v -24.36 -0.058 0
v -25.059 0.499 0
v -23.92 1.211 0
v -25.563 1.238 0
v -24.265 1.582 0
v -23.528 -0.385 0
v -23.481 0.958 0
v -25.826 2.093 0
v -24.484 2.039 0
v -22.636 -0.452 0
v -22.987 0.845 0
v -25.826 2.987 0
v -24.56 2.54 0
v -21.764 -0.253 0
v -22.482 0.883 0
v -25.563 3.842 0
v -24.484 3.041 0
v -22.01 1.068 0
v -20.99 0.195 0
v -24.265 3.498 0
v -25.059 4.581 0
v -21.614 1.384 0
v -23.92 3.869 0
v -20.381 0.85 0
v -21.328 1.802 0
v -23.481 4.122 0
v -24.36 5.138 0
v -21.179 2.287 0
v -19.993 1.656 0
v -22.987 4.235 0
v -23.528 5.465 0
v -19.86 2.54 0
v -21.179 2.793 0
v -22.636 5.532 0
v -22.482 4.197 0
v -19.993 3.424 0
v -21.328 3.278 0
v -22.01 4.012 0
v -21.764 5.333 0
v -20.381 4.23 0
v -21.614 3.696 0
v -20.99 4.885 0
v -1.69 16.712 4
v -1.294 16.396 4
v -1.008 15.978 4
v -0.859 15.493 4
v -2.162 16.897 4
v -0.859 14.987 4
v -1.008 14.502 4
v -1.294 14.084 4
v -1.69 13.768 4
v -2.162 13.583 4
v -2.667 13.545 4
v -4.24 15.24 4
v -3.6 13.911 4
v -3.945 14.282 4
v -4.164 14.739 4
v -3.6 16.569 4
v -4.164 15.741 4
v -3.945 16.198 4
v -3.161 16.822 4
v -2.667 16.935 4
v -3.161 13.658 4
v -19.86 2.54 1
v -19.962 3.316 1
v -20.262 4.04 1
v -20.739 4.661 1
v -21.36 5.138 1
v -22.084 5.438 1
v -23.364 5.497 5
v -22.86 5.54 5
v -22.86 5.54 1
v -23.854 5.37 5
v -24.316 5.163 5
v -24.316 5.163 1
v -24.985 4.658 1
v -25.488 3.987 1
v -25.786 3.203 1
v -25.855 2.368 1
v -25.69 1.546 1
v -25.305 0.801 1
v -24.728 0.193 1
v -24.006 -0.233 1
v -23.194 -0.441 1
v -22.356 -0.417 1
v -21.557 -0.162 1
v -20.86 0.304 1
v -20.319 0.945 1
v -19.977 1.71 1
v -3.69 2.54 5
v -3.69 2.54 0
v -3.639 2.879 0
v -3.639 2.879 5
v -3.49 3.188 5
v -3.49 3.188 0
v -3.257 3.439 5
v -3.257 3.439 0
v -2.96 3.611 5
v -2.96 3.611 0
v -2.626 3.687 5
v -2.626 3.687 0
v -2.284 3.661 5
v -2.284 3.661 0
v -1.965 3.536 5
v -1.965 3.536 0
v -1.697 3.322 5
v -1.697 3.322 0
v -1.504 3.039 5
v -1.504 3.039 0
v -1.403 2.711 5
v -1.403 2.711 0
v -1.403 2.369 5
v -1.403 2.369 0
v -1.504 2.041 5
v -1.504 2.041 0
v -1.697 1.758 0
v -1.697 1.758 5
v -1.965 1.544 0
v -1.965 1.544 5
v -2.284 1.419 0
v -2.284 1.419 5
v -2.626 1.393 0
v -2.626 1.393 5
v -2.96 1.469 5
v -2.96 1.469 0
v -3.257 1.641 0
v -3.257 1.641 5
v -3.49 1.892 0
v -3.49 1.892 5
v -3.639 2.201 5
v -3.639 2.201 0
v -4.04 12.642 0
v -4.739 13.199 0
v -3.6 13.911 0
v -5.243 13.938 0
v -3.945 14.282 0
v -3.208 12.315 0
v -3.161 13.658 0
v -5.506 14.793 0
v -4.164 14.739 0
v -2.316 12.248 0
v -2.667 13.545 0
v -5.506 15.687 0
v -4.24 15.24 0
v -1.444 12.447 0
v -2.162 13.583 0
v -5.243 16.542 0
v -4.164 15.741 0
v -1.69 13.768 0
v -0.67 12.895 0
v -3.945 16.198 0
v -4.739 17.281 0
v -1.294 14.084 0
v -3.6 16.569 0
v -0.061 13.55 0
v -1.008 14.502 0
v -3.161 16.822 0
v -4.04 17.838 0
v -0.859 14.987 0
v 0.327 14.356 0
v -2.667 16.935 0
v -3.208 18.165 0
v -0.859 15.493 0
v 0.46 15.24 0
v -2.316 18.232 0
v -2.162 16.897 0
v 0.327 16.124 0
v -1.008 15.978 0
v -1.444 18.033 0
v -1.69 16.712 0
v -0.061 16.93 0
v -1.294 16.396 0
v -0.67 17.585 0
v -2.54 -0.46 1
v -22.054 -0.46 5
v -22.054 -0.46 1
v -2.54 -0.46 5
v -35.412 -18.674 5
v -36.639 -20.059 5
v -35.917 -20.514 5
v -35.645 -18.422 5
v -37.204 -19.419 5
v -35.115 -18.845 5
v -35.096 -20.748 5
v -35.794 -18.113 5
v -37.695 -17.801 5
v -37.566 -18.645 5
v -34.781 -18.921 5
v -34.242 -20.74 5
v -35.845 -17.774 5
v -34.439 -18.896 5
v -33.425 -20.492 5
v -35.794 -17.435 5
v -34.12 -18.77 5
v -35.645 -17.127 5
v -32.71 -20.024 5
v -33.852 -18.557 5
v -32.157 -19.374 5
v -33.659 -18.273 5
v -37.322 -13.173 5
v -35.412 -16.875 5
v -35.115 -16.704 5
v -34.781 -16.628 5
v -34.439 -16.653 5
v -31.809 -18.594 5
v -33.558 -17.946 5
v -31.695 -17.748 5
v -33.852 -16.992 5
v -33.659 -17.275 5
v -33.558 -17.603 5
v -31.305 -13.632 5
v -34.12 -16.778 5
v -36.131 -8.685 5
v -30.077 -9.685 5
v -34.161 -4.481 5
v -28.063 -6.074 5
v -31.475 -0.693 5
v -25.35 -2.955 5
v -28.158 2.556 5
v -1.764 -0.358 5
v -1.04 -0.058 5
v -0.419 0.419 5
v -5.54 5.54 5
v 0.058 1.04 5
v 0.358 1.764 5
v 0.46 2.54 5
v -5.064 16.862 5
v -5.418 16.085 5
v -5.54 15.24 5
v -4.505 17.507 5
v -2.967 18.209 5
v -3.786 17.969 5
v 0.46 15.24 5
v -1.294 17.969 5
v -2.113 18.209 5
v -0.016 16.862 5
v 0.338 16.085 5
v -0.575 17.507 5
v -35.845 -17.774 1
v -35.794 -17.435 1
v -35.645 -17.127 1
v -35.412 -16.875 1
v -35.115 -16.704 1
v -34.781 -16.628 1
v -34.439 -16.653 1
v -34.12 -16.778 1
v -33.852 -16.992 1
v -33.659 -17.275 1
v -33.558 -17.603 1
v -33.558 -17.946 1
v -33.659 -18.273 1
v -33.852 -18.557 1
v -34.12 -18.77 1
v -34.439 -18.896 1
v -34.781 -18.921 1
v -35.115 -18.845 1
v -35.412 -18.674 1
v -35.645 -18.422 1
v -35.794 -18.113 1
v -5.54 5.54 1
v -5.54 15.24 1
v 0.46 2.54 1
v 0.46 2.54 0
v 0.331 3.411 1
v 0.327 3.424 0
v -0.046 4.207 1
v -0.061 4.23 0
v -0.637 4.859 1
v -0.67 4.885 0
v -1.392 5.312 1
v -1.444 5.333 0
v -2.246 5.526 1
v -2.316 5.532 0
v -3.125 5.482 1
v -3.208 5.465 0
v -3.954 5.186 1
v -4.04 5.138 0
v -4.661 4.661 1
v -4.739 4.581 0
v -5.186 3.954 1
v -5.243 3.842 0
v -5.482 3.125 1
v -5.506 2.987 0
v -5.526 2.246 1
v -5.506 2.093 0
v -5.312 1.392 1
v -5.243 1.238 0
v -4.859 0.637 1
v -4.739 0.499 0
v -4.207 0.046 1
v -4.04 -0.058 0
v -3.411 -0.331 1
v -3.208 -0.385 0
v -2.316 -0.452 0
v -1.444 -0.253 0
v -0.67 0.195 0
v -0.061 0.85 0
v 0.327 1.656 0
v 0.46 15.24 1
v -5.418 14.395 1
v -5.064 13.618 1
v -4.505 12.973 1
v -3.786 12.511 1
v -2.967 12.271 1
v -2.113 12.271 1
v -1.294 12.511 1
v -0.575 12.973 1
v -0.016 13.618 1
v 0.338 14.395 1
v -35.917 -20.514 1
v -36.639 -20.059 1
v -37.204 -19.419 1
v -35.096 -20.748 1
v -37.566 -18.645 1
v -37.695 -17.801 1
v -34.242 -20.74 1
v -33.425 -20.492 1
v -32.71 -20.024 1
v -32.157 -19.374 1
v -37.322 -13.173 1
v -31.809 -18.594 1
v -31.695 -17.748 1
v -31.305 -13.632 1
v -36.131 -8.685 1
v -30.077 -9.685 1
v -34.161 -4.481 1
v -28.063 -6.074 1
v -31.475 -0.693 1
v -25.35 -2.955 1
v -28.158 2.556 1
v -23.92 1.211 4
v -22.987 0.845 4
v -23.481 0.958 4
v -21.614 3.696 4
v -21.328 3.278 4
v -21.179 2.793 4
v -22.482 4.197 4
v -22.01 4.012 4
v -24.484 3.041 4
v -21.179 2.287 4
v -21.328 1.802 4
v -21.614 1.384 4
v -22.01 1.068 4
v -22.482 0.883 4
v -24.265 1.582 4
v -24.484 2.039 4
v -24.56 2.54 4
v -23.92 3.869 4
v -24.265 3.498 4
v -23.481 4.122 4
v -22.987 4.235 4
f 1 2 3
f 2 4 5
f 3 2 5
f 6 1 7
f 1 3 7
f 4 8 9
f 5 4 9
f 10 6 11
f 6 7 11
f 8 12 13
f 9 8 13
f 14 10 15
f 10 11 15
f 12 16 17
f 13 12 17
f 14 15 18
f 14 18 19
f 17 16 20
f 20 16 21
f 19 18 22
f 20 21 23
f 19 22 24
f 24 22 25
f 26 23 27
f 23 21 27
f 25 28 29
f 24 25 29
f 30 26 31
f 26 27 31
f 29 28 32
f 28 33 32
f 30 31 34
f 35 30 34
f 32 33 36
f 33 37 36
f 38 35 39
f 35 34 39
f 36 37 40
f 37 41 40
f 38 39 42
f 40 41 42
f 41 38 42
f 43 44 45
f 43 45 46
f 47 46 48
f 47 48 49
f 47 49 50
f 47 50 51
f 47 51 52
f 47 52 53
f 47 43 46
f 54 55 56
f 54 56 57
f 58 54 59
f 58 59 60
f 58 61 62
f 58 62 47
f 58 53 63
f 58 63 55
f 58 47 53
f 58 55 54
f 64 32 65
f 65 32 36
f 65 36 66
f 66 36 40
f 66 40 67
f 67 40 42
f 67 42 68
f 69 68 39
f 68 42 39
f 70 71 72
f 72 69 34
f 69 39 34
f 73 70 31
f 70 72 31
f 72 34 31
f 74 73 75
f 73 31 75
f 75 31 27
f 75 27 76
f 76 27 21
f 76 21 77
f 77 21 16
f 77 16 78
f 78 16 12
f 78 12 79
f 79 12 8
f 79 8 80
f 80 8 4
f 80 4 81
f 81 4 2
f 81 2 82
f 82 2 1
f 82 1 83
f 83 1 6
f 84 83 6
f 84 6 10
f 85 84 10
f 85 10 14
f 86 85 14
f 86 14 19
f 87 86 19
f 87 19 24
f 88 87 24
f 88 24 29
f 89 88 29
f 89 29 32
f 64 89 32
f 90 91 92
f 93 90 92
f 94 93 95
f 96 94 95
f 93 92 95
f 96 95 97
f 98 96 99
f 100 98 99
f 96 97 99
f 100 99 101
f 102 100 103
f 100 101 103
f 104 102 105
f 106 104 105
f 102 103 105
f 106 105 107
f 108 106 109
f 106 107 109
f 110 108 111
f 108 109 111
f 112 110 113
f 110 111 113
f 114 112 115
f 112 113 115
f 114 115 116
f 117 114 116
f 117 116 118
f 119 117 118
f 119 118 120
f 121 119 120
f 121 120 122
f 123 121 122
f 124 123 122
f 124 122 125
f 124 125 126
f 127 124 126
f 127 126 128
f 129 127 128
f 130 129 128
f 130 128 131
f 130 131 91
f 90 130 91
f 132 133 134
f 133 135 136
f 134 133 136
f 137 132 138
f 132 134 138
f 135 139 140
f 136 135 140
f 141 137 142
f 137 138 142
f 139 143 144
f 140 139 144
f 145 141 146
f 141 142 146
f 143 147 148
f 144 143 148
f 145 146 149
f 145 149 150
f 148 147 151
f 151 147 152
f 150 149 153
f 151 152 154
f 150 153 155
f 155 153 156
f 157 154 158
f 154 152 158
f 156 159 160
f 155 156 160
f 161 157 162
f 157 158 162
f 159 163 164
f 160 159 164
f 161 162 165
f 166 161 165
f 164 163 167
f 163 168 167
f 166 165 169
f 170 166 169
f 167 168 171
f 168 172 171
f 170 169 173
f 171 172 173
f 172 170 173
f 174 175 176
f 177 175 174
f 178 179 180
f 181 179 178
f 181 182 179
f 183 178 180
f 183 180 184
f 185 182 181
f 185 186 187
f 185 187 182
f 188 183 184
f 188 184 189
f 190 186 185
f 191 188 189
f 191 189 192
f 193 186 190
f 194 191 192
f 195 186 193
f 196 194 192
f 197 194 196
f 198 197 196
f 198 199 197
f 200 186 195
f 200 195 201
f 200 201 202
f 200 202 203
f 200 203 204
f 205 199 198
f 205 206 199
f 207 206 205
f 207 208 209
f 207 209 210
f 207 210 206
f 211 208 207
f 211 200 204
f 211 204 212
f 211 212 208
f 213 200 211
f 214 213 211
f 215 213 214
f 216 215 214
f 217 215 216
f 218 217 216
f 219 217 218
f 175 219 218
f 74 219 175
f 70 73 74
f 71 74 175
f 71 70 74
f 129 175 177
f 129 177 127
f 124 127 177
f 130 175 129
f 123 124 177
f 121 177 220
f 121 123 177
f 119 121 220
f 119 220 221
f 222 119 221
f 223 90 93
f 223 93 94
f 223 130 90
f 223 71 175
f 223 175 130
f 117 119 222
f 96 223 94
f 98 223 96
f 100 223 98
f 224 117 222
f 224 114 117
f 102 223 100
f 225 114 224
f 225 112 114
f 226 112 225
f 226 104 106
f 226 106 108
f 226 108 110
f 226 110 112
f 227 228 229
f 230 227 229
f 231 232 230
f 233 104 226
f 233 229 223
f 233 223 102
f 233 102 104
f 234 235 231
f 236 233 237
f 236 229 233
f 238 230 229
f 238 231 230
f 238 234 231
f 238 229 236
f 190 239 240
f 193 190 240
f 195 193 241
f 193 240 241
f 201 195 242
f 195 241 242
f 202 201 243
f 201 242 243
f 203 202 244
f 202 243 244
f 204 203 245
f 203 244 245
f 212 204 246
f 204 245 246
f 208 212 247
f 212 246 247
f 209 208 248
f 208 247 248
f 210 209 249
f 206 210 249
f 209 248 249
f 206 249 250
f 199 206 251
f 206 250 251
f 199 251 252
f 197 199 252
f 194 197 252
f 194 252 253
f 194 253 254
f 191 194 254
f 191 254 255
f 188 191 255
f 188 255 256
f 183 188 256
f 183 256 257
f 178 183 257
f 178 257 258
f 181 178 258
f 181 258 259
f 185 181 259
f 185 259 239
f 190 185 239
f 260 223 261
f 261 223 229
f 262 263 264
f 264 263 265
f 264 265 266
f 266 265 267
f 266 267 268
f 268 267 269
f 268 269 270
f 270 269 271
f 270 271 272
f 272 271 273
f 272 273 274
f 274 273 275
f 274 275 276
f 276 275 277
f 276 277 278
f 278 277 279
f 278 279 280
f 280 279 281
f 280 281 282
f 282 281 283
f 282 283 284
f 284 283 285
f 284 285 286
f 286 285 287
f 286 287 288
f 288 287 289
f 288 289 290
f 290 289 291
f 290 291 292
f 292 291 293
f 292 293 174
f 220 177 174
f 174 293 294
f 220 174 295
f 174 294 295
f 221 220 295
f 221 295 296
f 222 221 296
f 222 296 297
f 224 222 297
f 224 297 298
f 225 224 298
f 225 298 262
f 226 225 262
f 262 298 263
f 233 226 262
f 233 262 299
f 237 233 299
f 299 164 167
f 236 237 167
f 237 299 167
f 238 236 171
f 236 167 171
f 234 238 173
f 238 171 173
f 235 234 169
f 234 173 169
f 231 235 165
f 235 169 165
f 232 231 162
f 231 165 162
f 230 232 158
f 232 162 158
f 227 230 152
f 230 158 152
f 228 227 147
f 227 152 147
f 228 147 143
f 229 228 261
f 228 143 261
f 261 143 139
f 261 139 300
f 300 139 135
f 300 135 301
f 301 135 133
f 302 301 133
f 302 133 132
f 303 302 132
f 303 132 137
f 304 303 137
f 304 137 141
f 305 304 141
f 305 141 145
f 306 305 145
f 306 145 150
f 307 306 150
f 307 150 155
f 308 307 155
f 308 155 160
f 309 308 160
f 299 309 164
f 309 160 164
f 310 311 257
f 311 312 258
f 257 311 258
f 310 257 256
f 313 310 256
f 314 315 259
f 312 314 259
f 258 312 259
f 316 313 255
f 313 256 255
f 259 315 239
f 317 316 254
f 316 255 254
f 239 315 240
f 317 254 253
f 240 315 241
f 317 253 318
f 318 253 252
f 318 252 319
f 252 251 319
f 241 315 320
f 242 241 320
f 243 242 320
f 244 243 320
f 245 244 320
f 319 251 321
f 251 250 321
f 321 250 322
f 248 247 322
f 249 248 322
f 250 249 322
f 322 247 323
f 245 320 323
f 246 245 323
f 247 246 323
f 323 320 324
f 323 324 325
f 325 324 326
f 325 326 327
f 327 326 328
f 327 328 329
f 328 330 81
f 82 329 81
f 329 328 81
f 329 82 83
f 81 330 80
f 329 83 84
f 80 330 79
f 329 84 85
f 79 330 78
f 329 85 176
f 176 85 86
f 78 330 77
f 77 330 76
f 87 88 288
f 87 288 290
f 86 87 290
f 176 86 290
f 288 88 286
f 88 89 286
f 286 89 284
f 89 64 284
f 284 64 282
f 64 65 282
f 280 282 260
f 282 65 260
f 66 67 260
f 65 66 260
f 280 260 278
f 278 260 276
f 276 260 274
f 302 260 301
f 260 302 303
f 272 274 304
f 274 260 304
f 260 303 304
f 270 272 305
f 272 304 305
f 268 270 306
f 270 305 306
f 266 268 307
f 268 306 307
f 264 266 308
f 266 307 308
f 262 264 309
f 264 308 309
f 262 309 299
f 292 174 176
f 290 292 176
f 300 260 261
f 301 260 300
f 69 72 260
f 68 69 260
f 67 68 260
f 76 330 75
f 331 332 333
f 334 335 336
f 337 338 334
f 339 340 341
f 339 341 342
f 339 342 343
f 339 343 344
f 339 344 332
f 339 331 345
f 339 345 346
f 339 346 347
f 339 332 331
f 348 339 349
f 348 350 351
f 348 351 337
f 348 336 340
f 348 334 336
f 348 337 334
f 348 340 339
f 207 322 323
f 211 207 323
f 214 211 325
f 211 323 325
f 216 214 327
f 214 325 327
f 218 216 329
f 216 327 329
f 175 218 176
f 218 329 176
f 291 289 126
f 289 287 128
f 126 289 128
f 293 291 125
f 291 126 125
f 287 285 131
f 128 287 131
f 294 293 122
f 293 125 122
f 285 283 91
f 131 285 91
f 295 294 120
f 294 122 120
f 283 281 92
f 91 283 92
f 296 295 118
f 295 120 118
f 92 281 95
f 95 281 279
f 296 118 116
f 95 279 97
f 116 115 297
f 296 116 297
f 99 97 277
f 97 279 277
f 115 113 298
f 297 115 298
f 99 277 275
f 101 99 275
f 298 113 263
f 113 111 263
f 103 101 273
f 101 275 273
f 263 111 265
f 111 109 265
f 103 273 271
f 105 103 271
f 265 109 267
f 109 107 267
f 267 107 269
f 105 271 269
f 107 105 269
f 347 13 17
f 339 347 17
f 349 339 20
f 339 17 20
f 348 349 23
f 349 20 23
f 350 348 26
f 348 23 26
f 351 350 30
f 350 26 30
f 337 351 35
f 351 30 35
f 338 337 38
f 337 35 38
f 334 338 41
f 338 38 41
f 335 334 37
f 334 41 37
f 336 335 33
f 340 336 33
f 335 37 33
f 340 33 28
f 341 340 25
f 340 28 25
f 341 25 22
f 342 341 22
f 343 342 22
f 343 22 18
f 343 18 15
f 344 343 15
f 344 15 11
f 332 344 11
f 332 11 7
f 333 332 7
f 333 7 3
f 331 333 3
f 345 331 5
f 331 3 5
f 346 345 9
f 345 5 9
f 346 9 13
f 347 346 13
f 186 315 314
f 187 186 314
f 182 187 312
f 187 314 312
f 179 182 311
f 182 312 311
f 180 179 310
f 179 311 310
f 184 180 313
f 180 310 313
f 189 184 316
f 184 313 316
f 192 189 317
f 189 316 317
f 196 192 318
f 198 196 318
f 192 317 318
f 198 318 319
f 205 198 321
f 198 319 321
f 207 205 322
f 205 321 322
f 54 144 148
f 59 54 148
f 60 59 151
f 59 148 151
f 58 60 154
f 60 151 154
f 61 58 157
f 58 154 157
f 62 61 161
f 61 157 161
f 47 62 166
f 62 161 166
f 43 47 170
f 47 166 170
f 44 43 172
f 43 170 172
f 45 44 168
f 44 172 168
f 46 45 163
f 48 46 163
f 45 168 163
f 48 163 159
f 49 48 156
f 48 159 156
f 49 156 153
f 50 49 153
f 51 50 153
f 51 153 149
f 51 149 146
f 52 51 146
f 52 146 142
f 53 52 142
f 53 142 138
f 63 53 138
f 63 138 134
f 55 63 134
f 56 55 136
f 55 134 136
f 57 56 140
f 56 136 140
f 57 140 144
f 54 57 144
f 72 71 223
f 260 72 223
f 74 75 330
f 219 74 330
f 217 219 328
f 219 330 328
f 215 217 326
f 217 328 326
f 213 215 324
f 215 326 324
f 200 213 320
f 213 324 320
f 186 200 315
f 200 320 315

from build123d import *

# Parameters (mm, degrees)
SKIZZE1_R                         = 3
AUFSATZ_LINEAR_AUSTRAGEN1_DEPTH   = 5
AUFSATZ_LINEAR_AUSTRAGEN1_2_DEPTH = 5
AUFSATZ_LINEAR_AUSTRAGEN1_3_DEPTH = 5
SKIZZE2_W                         = 6
SKIZZE2_H                         = 12.7
AUFSATZ_LINEAR_AUSTRAGEN2_DEPTH   = 4
SKIZZE3_W                         = 20.32
SKIZZE3_H                         = 6
AUFSATZ_LINEAR_AUSTRAGEN3_DEPTH   = 4
AUFSATZ_LINEAR_AUSTRAGEN6_DEPTH   = 4
SKIZZE10_R                        = 3
AUFSATZ_LINEAR_AUSTRAGEN7_DEPTH   = 4
SKIZZE11_R                        = 1.7
SCHNITT_LINEAR_AUSTRAGEN5_DEPTH   = 4
SKIZZE12_R                        = 1.15
SCHNITT_LINEAR_AUSTRAGEN6_DEPTH   = 5
SKIZZE14_R                        = 1.15
SCHNITT_LINEAR_AUSTRAGEN8_DEPTH   = 6
SKIZZE15_R                        = 3
SKIZZE15_R_2                      = 1.15
AUFSATZ_LINEAR_AUSTRAGEN9_DEPTH   = 8.13
SKIZZE19_W                        = 52.396987113
SKIZZE19_H                        = 51.888823268
SCHNITT_LINEAR_AUSTRAGEN12_DEPTH  = 4.13


with BuildPart() as part:
    # Skizze1 → Aufsatz-Linear austragen1 (new body)
    with BuildSketch(Plane.XY):
        with Locations((-2.54, 2.54)):
            Circle(SKIZZE1_R)
    extrude(amount=AUFSATZ_LINEAR_AUSTRAGEN1_DEPTH)



with BuildPart() as body_2:
    # Skizze1 → Aufsatz-Linear austragen1 2 (new body)
    with BuildSketch(Plane.XY):
        with Locations((-2.54, 15.24)):
            Circle(SKIZZE1_R)
    extrude(amount=AUFSATZ_LINEAR_AUSTRAGEN1_2_DEPTH)


with BuildPart() as body_3:
    # Skizze1 → Aufsatz-Linear austragen1 3 (new body)
    with BuildSketch(Plane.XY):
        with Locations((-22.86, 2.54)):
            Circle(SKIZZE1_R)
    extrude(amount=AUFSATZ_LINEAR_AUSTRAGEN1_3_DEPTH)


with BuildPart() as part_1:
    add(part.part)

    add(body_2.part)  # Aufsatz-Linear austragen2 merges body 2
    # Skizze2 → Aufsatz-Linear austragen2 (add)
    with BuildSketch(Plane.XY.offset(5)):
        with Locations((-2.54, 8.89)):
            Rectangle(SKIZZE2_W, SKIZZE2_H)
    extrude(amount=-AUFSATZ_LINEAR_AUSTRAGEN2_DEPTH)

    # Skizze3 → Aufsatz-Linear austragen3 (add)
    with BuildSketch(Plane.XY.offset(5)):
        with Locations((-12.7, 2.54)):
            Rectangle(SKIZZE3_W, SKIZZE3_H)
    extrude(amount=-AUFSATZ_LINEAR_AUSTRAGEN3_DEPTH)


    add(body_3.part)  # Aufsatz-Linear austragen6 merges body 3
    # Skizze9 → Aufsatz-Linear austragen6 (add)
    with BuildSketch(Plane(origin=(0, 0, 1), x_dir=(-1, 0, 0), z_dir=(0, 0, -1))):
        with BuildLine():
            Line((21.403833859, -0.082895379), (24.316166141, 5.162895379))
            ThreePointArc((24.316166141, 5.162895379), (34.161496772, -4.480544132), (37.695021225, -17.801229766))
            ThreePointArc((37.695021225, -17.801229766), (34.668329668, -20.774298587), (31.695260847, -17.747607029))
            ThreePointArc((31.695260847, -17.747607029), (28.977165113, -7.500925772), (21.403833859, -0.082895379))
        make_face()
    extrude(amount=-AUFSATZ_LINEAR_AUSTRAGEN6_DEPTH)

    # Skizze10 → Aufsatz-Linear austragen7 (add)
    with BuildSketch(Plane(origin=(0, 0, 1), x_dir=(-1, 0, 0), z_dir=(0, 0, -1))):
        with Locations((34.695141036, -17.774418398)):
            Circle(SKIZZE10_R)
    extrude(amount=-AUFSATZ_LINEAR_AUSTRAGEN7_DEPTH)

    # Skizze11 → Schnitt-Linear austragen5 (cut)
    with BuildSketch(Plane(origin=(0, 0, 0), x_dir=(-1, 0, 0), z_dir=(0, 0, -1))):
        with Locations((2.54, 15.24)):
            Circle(SKIZZE11_R)
        with Locations((22.86, 2.54)):
            Circle(SKIZZE11_R)
    extrude(amount=-SCHNITT_LINEAR_AUSTRAGEN5_DEPTH, mode=Mode.SUBTRACT)

    # Skizze12 → Schnitt-Linear austragen6 (cut, through all)
    with BuildSketch(Plane(origin=(0, 0, 1), x_dir=(-1, 0, 0), z_dir=(0, 0, -1))):
        with Locations((34.695141036, -17.774418398)):
            Circle(SKIZZE12_R)
    extrude(amount=-SCHNITT_LINEAR_AUSTRAGEN6_DEPTH, mode=Mode.SUBTRACT)

    # Skizze14 → Schnitt-Linear austragen8 (cut, through all)
    with BuildSketch(Plane(origin=(0, 0, 0), x_dir=(-1, 0, 0), z_dir=(0, 0, -1))):
        with Locations((2.54, 2.54)):
            Circle(SKIZZE14_R)
    extrude(amount=-SCHNITT_LINEAR_AUSTRAGEN8_DEPTH, mode=Mode.SUBTRACT)

    # Skizze15 → Aufsatz-Linear austragen9 (add)
    with BuildSketch(Plane(origin=(0, 0, 0), x_dir=(-1, 0, 0), z_dir=(0, 0, -1))):
        with Locations((2.54, 2.54)):
            Circle(SKIZZE15_R)
        with Locations((2.54, 2.54)):
            Circle(SKIZZE15_R_2, mode=Mode.SUBTRACT)
    extrude(amount=-AUFSATZ_LINEAR_AUSTRAGEN9_DEPTH)

    # Skizze19 → Schnitt-Linear austragen12 (cut, through all)
    with BuildSketch(Plane.XY.offset(5)):
        with Locations((-20.173492866, -0.896131467)):
            Rectangle(SKIZZE19_W, SKIZZE19_H)
    extrude(amount=SCHNITT_LINEAR_AUSTRAGEN12_DEPTH, mode=Mode.SUBTRACT)


solid = part_1.part
